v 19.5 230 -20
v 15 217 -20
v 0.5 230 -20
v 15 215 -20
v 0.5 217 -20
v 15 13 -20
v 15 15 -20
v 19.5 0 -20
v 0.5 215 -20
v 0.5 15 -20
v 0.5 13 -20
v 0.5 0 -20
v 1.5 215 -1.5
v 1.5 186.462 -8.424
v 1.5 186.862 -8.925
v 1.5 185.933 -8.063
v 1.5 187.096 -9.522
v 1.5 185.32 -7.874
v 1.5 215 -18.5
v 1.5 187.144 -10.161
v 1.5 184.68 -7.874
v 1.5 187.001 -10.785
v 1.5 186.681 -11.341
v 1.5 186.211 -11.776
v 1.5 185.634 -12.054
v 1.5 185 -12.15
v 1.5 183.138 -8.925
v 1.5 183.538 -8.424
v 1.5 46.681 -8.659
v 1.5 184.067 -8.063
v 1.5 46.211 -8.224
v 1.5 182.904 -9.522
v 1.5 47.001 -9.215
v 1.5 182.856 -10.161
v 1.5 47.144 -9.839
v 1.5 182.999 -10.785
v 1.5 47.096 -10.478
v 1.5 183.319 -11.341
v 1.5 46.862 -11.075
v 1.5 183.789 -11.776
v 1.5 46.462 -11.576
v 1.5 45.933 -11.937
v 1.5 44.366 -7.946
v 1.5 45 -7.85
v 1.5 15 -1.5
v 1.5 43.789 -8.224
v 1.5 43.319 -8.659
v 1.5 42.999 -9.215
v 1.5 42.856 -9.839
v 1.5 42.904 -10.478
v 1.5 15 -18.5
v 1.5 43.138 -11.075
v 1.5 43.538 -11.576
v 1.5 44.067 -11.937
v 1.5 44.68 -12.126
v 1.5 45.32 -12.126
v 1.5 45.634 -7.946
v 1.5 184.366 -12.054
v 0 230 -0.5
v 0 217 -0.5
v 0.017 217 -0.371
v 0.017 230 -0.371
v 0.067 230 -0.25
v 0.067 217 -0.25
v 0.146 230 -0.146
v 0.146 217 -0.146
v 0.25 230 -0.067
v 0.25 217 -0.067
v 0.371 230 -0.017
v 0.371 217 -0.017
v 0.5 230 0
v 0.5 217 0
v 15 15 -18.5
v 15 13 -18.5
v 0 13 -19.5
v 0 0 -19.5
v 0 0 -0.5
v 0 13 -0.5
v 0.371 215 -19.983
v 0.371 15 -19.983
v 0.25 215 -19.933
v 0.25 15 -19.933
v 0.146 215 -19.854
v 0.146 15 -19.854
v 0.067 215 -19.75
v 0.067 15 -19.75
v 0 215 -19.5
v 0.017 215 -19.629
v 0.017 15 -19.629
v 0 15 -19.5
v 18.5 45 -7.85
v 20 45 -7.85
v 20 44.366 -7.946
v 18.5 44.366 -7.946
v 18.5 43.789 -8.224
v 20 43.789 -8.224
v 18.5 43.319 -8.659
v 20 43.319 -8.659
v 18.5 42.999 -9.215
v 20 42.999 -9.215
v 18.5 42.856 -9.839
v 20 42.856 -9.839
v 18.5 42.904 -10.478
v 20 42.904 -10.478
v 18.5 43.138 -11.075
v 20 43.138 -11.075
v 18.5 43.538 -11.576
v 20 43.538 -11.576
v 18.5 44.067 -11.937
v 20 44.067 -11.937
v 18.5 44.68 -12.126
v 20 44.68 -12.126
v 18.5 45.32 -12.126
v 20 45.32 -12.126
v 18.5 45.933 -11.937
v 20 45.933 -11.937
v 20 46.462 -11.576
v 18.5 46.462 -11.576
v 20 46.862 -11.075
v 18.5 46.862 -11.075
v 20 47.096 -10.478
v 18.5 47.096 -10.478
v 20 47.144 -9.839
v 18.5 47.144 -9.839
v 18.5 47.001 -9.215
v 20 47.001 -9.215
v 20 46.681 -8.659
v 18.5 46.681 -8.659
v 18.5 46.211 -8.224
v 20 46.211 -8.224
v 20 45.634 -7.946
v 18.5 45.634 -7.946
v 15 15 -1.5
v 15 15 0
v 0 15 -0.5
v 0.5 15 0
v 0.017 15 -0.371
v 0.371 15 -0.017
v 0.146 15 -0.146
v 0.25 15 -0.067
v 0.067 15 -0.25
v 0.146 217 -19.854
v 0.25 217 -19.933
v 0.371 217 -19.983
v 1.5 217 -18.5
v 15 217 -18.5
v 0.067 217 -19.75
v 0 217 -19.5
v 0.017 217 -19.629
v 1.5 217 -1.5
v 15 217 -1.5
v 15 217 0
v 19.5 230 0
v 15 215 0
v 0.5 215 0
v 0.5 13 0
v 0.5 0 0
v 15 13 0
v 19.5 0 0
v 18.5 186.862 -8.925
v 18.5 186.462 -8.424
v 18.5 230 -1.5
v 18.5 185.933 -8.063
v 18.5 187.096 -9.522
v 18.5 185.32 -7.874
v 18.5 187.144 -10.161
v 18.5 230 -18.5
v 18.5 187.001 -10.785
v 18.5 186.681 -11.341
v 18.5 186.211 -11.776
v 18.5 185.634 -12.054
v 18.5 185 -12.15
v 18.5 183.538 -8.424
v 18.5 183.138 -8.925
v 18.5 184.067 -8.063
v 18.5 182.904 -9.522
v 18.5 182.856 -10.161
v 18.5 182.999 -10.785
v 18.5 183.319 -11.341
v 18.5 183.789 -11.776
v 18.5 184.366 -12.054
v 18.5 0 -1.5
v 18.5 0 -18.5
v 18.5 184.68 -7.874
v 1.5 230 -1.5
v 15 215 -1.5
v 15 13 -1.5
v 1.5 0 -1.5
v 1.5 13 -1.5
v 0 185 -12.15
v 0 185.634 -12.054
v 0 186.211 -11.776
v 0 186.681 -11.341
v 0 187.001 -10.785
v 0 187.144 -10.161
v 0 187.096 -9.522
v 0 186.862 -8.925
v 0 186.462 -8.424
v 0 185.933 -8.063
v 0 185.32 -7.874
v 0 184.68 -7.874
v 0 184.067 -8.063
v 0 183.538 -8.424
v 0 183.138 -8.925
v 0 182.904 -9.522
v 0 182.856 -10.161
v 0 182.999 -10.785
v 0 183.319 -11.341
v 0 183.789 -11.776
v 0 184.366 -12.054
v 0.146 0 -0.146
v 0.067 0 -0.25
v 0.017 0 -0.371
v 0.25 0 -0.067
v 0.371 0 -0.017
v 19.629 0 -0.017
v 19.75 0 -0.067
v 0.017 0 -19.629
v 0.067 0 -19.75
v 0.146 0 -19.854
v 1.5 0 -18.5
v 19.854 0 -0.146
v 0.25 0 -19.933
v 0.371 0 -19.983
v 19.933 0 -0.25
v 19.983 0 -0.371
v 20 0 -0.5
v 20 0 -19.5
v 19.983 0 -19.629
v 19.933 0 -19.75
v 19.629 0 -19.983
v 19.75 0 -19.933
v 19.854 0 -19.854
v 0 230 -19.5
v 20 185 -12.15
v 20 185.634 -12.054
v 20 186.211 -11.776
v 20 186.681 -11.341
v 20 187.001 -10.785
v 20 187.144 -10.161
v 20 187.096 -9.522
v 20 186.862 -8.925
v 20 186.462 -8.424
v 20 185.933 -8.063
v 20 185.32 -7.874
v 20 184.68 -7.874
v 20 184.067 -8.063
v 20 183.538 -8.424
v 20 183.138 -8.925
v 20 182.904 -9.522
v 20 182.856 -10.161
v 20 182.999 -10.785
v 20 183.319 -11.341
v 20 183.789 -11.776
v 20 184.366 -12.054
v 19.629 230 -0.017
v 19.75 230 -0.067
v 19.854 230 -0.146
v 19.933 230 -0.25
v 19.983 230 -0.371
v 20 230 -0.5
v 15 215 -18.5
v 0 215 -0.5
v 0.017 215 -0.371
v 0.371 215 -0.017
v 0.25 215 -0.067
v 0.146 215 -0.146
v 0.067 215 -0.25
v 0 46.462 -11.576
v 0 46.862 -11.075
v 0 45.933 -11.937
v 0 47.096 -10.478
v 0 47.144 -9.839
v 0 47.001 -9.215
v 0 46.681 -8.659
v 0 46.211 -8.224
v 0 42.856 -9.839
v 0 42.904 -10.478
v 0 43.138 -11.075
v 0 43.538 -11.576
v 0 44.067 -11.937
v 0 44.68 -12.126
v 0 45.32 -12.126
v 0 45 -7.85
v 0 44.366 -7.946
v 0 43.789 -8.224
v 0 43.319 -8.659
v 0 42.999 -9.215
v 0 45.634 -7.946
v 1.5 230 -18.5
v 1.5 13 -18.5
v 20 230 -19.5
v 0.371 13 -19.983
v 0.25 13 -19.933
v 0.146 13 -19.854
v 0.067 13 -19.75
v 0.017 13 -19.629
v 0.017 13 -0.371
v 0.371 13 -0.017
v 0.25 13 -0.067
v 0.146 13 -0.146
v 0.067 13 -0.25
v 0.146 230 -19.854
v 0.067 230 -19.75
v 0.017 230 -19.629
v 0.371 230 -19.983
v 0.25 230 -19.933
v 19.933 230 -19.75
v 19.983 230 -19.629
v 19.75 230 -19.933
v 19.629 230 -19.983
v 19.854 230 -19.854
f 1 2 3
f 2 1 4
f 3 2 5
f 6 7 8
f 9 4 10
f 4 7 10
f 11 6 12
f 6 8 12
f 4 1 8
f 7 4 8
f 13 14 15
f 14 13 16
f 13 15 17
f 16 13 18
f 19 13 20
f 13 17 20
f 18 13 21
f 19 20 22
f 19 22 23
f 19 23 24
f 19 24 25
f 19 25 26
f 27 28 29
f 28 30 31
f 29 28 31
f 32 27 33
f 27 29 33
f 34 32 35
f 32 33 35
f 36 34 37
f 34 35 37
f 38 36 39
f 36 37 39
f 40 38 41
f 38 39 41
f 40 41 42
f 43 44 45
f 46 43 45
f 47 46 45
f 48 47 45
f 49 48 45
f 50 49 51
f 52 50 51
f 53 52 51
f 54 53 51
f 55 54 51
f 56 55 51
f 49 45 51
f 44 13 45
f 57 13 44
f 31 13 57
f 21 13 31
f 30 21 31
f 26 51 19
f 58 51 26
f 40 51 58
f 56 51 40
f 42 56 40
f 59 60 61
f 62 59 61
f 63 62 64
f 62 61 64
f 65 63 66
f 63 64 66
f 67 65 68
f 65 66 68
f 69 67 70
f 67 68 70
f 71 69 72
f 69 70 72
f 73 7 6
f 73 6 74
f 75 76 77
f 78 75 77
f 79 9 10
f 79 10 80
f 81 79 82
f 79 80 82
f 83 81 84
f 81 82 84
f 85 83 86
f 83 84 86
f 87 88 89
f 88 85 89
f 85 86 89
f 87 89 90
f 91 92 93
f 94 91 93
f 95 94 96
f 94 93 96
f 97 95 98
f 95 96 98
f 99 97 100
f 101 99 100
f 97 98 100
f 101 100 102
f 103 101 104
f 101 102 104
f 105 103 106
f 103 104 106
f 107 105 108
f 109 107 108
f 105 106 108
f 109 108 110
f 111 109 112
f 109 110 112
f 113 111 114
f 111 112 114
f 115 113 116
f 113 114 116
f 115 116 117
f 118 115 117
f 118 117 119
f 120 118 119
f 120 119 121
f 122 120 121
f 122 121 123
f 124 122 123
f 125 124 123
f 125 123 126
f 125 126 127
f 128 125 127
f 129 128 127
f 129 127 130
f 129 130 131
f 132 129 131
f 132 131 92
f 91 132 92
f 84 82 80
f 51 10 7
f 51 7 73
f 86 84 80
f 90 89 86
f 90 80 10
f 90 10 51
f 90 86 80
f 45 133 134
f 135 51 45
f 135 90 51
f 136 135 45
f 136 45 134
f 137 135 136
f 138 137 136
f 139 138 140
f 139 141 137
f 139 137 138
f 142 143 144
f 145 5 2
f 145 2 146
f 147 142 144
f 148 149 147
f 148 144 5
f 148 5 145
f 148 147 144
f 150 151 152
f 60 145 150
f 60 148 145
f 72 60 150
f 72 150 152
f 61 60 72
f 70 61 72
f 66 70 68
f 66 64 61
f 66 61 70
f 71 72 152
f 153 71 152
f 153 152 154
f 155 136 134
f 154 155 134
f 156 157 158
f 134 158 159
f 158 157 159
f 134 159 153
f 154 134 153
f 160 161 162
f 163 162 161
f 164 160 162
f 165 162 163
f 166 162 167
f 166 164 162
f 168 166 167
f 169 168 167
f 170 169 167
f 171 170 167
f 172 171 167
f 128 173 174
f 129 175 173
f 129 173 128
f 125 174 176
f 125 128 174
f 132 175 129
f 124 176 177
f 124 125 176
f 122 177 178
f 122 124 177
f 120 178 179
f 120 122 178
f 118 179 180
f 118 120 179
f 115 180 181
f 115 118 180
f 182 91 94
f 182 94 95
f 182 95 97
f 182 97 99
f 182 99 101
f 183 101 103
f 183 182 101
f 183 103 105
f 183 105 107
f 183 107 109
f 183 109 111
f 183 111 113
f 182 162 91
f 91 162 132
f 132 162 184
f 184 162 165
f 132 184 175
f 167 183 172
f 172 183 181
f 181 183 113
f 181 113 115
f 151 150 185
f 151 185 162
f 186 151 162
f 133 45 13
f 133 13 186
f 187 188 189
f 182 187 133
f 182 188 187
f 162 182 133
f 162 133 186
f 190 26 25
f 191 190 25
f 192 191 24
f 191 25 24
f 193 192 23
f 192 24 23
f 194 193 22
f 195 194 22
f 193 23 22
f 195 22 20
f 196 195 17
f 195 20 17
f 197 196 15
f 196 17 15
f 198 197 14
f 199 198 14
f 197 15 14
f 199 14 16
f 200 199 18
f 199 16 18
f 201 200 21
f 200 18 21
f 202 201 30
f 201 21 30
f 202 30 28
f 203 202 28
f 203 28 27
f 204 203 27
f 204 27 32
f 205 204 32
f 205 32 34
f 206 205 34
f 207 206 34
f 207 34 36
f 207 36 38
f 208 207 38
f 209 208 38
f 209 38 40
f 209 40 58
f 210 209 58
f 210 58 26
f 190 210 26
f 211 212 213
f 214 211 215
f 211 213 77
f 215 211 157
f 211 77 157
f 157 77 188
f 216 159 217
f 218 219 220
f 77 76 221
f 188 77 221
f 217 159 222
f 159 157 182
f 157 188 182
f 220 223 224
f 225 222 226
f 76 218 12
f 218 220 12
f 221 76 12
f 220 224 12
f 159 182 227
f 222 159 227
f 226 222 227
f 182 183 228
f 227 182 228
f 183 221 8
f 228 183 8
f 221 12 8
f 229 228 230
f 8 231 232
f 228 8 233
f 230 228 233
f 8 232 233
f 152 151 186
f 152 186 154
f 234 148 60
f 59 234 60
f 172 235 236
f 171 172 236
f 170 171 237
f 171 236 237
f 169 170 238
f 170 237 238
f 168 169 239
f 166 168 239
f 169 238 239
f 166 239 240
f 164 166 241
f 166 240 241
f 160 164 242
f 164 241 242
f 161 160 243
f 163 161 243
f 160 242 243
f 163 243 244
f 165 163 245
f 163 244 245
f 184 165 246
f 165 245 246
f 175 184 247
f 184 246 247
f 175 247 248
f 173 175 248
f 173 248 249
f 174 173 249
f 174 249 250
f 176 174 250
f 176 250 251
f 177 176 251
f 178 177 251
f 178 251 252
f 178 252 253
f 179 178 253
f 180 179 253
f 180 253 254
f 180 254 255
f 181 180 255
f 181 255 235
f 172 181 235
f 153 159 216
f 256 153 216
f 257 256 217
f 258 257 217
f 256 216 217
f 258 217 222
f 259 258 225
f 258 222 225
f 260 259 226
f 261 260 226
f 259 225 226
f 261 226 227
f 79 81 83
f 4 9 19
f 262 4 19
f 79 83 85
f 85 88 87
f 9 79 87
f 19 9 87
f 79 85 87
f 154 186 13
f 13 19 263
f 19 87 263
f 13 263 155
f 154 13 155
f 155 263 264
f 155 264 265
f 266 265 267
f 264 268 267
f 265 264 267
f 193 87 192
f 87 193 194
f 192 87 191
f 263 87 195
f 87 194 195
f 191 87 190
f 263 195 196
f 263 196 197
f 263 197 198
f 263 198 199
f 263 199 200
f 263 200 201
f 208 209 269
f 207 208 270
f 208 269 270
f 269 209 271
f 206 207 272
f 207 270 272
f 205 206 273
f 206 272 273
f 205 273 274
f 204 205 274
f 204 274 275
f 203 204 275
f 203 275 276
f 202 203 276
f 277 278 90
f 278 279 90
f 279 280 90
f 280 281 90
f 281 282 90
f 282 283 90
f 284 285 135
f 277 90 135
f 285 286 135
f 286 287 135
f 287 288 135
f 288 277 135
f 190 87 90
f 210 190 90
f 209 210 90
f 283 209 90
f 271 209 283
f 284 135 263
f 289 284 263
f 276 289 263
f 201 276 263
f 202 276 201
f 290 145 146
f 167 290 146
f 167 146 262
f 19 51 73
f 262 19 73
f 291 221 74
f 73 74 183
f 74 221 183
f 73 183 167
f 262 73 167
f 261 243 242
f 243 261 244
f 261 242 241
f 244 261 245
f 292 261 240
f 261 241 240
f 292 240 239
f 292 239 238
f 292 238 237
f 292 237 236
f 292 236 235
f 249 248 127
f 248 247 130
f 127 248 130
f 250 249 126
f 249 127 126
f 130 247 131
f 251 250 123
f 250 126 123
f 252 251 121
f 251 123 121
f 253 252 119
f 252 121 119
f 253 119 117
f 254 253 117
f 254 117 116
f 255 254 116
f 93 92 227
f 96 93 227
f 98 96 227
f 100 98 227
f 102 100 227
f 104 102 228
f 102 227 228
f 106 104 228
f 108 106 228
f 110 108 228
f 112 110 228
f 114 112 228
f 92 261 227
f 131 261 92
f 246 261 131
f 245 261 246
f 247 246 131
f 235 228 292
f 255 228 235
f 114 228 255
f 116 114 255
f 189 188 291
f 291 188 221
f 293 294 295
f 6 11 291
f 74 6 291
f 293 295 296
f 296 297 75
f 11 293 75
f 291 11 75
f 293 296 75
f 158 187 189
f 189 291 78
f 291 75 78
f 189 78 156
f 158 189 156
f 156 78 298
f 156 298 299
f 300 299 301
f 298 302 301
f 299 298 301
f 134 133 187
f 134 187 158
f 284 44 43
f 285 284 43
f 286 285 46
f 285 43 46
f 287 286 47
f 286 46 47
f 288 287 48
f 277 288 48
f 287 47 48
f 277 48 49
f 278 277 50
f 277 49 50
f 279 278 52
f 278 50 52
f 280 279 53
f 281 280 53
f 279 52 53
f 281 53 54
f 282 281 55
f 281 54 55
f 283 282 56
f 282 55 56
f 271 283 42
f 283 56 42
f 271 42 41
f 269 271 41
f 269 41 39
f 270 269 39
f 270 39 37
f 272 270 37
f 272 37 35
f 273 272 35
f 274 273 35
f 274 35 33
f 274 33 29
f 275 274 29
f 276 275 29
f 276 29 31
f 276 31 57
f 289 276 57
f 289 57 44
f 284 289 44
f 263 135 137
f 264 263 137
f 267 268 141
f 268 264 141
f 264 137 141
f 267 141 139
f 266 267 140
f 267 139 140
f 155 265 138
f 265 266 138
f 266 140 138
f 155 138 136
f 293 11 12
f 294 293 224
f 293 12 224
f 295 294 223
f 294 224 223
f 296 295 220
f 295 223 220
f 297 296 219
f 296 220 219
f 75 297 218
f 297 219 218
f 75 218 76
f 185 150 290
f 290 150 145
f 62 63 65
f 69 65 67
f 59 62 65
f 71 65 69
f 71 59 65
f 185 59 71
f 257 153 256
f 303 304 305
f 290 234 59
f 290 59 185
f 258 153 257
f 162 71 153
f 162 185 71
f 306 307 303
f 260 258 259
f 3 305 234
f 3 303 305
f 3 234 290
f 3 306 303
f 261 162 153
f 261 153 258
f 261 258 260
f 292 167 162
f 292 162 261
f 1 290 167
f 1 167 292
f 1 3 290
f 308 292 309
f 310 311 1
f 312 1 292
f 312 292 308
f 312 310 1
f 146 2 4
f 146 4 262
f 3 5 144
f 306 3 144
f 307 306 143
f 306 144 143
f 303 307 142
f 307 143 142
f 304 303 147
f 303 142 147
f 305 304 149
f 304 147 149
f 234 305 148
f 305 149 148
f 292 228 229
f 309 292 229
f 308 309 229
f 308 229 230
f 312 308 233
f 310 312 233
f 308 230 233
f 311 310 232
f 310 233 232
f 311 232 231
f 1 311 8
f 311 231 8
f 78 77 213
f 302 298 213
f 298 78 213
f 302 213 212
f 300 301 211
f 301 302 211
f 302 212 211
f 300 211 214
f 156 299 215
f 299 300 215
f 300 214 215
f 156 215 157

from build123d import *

# Parameters (mm, degrees)
SKETCH1_W           = 17
SKETCH1_H           = 17
BOSS_EXTRUDE1_DEPTH = 230
SKETCH2_W           = 20
SKETCH2_H           = 2
CUT_EXTRUDE1_DEPTH  = 15
SKETCH3_R           = 2.15
CUT_EXTRUDE2_DEPTH  = 232.732604525


with BuildPart() as part:
    # Sketch1 → Boss-Extrude1 (new body)
    with BuildSketch(Plane(origin=(0, 0, 0), x_dir=(1, 0, 0), z_dir=(0, 1, 0))):
        with BuildLine():
            Line((0.5, 0), (19.5, 0))
            ThreePointArc((19.5, 0), (19.853553391, 0.146446609), (20, 0.5))
            Line((20, 0.5), (20, 19.5))
            ThreePointArc((20, 19.5), (19.853553391, 19.853553391), (19.5, 20))
            Line((19.5, 20), (0.5, 20))
            ThreePointArc((0.5, 20), (0.146446609, 19.853553391), (0, 19.5))
            Line((0, 19.5), (0, 0.5))
            ThreePointArc((0, 0.5), (0.146446609, 0.146446609), (0.5, 0))
        make_face()
        with Locations((10, 10)):
            Rectangle(SKETCH1_W, SKETCH1_H, mode=Mode.SUBTRACT)
    extrude(amount=BOSS_EXTRUDE1_DEPTH)

    # Sketch2 → Cut-Extrude1 (cut)
    with BuildSketch(Plane.ZY):
        with Locations((-10, 14)):
            Rectangle(SKETCH2_W, SKETCH2_H)
        with Locations((-10, 216)):
            Rectangle(SKETCH2_W, SKETCH2_H)
    extrude(amount=-CUT_EXTRUDE1_DEPTH, mode=Mode.SUBTRACT)

    # Sketch3 → Cut-Extrude2 (cut, through all)
    with BuildSketch(Plane(origin=(20, 0, 0), x_dir=(0, 0, -1), z_dir=(1, 0, 0))):
        with Locations((10, 185)):
            Circle(SKETCH3_R)
        with Locations(Location((10, 45, 0), (0, 0, 180))):
            Circle(SKETCH3_R)
    extrude(amount=-CUT_EXTRUDE2_DEPTH, mode=Mode.SUBTRACT)


solid = part.part
